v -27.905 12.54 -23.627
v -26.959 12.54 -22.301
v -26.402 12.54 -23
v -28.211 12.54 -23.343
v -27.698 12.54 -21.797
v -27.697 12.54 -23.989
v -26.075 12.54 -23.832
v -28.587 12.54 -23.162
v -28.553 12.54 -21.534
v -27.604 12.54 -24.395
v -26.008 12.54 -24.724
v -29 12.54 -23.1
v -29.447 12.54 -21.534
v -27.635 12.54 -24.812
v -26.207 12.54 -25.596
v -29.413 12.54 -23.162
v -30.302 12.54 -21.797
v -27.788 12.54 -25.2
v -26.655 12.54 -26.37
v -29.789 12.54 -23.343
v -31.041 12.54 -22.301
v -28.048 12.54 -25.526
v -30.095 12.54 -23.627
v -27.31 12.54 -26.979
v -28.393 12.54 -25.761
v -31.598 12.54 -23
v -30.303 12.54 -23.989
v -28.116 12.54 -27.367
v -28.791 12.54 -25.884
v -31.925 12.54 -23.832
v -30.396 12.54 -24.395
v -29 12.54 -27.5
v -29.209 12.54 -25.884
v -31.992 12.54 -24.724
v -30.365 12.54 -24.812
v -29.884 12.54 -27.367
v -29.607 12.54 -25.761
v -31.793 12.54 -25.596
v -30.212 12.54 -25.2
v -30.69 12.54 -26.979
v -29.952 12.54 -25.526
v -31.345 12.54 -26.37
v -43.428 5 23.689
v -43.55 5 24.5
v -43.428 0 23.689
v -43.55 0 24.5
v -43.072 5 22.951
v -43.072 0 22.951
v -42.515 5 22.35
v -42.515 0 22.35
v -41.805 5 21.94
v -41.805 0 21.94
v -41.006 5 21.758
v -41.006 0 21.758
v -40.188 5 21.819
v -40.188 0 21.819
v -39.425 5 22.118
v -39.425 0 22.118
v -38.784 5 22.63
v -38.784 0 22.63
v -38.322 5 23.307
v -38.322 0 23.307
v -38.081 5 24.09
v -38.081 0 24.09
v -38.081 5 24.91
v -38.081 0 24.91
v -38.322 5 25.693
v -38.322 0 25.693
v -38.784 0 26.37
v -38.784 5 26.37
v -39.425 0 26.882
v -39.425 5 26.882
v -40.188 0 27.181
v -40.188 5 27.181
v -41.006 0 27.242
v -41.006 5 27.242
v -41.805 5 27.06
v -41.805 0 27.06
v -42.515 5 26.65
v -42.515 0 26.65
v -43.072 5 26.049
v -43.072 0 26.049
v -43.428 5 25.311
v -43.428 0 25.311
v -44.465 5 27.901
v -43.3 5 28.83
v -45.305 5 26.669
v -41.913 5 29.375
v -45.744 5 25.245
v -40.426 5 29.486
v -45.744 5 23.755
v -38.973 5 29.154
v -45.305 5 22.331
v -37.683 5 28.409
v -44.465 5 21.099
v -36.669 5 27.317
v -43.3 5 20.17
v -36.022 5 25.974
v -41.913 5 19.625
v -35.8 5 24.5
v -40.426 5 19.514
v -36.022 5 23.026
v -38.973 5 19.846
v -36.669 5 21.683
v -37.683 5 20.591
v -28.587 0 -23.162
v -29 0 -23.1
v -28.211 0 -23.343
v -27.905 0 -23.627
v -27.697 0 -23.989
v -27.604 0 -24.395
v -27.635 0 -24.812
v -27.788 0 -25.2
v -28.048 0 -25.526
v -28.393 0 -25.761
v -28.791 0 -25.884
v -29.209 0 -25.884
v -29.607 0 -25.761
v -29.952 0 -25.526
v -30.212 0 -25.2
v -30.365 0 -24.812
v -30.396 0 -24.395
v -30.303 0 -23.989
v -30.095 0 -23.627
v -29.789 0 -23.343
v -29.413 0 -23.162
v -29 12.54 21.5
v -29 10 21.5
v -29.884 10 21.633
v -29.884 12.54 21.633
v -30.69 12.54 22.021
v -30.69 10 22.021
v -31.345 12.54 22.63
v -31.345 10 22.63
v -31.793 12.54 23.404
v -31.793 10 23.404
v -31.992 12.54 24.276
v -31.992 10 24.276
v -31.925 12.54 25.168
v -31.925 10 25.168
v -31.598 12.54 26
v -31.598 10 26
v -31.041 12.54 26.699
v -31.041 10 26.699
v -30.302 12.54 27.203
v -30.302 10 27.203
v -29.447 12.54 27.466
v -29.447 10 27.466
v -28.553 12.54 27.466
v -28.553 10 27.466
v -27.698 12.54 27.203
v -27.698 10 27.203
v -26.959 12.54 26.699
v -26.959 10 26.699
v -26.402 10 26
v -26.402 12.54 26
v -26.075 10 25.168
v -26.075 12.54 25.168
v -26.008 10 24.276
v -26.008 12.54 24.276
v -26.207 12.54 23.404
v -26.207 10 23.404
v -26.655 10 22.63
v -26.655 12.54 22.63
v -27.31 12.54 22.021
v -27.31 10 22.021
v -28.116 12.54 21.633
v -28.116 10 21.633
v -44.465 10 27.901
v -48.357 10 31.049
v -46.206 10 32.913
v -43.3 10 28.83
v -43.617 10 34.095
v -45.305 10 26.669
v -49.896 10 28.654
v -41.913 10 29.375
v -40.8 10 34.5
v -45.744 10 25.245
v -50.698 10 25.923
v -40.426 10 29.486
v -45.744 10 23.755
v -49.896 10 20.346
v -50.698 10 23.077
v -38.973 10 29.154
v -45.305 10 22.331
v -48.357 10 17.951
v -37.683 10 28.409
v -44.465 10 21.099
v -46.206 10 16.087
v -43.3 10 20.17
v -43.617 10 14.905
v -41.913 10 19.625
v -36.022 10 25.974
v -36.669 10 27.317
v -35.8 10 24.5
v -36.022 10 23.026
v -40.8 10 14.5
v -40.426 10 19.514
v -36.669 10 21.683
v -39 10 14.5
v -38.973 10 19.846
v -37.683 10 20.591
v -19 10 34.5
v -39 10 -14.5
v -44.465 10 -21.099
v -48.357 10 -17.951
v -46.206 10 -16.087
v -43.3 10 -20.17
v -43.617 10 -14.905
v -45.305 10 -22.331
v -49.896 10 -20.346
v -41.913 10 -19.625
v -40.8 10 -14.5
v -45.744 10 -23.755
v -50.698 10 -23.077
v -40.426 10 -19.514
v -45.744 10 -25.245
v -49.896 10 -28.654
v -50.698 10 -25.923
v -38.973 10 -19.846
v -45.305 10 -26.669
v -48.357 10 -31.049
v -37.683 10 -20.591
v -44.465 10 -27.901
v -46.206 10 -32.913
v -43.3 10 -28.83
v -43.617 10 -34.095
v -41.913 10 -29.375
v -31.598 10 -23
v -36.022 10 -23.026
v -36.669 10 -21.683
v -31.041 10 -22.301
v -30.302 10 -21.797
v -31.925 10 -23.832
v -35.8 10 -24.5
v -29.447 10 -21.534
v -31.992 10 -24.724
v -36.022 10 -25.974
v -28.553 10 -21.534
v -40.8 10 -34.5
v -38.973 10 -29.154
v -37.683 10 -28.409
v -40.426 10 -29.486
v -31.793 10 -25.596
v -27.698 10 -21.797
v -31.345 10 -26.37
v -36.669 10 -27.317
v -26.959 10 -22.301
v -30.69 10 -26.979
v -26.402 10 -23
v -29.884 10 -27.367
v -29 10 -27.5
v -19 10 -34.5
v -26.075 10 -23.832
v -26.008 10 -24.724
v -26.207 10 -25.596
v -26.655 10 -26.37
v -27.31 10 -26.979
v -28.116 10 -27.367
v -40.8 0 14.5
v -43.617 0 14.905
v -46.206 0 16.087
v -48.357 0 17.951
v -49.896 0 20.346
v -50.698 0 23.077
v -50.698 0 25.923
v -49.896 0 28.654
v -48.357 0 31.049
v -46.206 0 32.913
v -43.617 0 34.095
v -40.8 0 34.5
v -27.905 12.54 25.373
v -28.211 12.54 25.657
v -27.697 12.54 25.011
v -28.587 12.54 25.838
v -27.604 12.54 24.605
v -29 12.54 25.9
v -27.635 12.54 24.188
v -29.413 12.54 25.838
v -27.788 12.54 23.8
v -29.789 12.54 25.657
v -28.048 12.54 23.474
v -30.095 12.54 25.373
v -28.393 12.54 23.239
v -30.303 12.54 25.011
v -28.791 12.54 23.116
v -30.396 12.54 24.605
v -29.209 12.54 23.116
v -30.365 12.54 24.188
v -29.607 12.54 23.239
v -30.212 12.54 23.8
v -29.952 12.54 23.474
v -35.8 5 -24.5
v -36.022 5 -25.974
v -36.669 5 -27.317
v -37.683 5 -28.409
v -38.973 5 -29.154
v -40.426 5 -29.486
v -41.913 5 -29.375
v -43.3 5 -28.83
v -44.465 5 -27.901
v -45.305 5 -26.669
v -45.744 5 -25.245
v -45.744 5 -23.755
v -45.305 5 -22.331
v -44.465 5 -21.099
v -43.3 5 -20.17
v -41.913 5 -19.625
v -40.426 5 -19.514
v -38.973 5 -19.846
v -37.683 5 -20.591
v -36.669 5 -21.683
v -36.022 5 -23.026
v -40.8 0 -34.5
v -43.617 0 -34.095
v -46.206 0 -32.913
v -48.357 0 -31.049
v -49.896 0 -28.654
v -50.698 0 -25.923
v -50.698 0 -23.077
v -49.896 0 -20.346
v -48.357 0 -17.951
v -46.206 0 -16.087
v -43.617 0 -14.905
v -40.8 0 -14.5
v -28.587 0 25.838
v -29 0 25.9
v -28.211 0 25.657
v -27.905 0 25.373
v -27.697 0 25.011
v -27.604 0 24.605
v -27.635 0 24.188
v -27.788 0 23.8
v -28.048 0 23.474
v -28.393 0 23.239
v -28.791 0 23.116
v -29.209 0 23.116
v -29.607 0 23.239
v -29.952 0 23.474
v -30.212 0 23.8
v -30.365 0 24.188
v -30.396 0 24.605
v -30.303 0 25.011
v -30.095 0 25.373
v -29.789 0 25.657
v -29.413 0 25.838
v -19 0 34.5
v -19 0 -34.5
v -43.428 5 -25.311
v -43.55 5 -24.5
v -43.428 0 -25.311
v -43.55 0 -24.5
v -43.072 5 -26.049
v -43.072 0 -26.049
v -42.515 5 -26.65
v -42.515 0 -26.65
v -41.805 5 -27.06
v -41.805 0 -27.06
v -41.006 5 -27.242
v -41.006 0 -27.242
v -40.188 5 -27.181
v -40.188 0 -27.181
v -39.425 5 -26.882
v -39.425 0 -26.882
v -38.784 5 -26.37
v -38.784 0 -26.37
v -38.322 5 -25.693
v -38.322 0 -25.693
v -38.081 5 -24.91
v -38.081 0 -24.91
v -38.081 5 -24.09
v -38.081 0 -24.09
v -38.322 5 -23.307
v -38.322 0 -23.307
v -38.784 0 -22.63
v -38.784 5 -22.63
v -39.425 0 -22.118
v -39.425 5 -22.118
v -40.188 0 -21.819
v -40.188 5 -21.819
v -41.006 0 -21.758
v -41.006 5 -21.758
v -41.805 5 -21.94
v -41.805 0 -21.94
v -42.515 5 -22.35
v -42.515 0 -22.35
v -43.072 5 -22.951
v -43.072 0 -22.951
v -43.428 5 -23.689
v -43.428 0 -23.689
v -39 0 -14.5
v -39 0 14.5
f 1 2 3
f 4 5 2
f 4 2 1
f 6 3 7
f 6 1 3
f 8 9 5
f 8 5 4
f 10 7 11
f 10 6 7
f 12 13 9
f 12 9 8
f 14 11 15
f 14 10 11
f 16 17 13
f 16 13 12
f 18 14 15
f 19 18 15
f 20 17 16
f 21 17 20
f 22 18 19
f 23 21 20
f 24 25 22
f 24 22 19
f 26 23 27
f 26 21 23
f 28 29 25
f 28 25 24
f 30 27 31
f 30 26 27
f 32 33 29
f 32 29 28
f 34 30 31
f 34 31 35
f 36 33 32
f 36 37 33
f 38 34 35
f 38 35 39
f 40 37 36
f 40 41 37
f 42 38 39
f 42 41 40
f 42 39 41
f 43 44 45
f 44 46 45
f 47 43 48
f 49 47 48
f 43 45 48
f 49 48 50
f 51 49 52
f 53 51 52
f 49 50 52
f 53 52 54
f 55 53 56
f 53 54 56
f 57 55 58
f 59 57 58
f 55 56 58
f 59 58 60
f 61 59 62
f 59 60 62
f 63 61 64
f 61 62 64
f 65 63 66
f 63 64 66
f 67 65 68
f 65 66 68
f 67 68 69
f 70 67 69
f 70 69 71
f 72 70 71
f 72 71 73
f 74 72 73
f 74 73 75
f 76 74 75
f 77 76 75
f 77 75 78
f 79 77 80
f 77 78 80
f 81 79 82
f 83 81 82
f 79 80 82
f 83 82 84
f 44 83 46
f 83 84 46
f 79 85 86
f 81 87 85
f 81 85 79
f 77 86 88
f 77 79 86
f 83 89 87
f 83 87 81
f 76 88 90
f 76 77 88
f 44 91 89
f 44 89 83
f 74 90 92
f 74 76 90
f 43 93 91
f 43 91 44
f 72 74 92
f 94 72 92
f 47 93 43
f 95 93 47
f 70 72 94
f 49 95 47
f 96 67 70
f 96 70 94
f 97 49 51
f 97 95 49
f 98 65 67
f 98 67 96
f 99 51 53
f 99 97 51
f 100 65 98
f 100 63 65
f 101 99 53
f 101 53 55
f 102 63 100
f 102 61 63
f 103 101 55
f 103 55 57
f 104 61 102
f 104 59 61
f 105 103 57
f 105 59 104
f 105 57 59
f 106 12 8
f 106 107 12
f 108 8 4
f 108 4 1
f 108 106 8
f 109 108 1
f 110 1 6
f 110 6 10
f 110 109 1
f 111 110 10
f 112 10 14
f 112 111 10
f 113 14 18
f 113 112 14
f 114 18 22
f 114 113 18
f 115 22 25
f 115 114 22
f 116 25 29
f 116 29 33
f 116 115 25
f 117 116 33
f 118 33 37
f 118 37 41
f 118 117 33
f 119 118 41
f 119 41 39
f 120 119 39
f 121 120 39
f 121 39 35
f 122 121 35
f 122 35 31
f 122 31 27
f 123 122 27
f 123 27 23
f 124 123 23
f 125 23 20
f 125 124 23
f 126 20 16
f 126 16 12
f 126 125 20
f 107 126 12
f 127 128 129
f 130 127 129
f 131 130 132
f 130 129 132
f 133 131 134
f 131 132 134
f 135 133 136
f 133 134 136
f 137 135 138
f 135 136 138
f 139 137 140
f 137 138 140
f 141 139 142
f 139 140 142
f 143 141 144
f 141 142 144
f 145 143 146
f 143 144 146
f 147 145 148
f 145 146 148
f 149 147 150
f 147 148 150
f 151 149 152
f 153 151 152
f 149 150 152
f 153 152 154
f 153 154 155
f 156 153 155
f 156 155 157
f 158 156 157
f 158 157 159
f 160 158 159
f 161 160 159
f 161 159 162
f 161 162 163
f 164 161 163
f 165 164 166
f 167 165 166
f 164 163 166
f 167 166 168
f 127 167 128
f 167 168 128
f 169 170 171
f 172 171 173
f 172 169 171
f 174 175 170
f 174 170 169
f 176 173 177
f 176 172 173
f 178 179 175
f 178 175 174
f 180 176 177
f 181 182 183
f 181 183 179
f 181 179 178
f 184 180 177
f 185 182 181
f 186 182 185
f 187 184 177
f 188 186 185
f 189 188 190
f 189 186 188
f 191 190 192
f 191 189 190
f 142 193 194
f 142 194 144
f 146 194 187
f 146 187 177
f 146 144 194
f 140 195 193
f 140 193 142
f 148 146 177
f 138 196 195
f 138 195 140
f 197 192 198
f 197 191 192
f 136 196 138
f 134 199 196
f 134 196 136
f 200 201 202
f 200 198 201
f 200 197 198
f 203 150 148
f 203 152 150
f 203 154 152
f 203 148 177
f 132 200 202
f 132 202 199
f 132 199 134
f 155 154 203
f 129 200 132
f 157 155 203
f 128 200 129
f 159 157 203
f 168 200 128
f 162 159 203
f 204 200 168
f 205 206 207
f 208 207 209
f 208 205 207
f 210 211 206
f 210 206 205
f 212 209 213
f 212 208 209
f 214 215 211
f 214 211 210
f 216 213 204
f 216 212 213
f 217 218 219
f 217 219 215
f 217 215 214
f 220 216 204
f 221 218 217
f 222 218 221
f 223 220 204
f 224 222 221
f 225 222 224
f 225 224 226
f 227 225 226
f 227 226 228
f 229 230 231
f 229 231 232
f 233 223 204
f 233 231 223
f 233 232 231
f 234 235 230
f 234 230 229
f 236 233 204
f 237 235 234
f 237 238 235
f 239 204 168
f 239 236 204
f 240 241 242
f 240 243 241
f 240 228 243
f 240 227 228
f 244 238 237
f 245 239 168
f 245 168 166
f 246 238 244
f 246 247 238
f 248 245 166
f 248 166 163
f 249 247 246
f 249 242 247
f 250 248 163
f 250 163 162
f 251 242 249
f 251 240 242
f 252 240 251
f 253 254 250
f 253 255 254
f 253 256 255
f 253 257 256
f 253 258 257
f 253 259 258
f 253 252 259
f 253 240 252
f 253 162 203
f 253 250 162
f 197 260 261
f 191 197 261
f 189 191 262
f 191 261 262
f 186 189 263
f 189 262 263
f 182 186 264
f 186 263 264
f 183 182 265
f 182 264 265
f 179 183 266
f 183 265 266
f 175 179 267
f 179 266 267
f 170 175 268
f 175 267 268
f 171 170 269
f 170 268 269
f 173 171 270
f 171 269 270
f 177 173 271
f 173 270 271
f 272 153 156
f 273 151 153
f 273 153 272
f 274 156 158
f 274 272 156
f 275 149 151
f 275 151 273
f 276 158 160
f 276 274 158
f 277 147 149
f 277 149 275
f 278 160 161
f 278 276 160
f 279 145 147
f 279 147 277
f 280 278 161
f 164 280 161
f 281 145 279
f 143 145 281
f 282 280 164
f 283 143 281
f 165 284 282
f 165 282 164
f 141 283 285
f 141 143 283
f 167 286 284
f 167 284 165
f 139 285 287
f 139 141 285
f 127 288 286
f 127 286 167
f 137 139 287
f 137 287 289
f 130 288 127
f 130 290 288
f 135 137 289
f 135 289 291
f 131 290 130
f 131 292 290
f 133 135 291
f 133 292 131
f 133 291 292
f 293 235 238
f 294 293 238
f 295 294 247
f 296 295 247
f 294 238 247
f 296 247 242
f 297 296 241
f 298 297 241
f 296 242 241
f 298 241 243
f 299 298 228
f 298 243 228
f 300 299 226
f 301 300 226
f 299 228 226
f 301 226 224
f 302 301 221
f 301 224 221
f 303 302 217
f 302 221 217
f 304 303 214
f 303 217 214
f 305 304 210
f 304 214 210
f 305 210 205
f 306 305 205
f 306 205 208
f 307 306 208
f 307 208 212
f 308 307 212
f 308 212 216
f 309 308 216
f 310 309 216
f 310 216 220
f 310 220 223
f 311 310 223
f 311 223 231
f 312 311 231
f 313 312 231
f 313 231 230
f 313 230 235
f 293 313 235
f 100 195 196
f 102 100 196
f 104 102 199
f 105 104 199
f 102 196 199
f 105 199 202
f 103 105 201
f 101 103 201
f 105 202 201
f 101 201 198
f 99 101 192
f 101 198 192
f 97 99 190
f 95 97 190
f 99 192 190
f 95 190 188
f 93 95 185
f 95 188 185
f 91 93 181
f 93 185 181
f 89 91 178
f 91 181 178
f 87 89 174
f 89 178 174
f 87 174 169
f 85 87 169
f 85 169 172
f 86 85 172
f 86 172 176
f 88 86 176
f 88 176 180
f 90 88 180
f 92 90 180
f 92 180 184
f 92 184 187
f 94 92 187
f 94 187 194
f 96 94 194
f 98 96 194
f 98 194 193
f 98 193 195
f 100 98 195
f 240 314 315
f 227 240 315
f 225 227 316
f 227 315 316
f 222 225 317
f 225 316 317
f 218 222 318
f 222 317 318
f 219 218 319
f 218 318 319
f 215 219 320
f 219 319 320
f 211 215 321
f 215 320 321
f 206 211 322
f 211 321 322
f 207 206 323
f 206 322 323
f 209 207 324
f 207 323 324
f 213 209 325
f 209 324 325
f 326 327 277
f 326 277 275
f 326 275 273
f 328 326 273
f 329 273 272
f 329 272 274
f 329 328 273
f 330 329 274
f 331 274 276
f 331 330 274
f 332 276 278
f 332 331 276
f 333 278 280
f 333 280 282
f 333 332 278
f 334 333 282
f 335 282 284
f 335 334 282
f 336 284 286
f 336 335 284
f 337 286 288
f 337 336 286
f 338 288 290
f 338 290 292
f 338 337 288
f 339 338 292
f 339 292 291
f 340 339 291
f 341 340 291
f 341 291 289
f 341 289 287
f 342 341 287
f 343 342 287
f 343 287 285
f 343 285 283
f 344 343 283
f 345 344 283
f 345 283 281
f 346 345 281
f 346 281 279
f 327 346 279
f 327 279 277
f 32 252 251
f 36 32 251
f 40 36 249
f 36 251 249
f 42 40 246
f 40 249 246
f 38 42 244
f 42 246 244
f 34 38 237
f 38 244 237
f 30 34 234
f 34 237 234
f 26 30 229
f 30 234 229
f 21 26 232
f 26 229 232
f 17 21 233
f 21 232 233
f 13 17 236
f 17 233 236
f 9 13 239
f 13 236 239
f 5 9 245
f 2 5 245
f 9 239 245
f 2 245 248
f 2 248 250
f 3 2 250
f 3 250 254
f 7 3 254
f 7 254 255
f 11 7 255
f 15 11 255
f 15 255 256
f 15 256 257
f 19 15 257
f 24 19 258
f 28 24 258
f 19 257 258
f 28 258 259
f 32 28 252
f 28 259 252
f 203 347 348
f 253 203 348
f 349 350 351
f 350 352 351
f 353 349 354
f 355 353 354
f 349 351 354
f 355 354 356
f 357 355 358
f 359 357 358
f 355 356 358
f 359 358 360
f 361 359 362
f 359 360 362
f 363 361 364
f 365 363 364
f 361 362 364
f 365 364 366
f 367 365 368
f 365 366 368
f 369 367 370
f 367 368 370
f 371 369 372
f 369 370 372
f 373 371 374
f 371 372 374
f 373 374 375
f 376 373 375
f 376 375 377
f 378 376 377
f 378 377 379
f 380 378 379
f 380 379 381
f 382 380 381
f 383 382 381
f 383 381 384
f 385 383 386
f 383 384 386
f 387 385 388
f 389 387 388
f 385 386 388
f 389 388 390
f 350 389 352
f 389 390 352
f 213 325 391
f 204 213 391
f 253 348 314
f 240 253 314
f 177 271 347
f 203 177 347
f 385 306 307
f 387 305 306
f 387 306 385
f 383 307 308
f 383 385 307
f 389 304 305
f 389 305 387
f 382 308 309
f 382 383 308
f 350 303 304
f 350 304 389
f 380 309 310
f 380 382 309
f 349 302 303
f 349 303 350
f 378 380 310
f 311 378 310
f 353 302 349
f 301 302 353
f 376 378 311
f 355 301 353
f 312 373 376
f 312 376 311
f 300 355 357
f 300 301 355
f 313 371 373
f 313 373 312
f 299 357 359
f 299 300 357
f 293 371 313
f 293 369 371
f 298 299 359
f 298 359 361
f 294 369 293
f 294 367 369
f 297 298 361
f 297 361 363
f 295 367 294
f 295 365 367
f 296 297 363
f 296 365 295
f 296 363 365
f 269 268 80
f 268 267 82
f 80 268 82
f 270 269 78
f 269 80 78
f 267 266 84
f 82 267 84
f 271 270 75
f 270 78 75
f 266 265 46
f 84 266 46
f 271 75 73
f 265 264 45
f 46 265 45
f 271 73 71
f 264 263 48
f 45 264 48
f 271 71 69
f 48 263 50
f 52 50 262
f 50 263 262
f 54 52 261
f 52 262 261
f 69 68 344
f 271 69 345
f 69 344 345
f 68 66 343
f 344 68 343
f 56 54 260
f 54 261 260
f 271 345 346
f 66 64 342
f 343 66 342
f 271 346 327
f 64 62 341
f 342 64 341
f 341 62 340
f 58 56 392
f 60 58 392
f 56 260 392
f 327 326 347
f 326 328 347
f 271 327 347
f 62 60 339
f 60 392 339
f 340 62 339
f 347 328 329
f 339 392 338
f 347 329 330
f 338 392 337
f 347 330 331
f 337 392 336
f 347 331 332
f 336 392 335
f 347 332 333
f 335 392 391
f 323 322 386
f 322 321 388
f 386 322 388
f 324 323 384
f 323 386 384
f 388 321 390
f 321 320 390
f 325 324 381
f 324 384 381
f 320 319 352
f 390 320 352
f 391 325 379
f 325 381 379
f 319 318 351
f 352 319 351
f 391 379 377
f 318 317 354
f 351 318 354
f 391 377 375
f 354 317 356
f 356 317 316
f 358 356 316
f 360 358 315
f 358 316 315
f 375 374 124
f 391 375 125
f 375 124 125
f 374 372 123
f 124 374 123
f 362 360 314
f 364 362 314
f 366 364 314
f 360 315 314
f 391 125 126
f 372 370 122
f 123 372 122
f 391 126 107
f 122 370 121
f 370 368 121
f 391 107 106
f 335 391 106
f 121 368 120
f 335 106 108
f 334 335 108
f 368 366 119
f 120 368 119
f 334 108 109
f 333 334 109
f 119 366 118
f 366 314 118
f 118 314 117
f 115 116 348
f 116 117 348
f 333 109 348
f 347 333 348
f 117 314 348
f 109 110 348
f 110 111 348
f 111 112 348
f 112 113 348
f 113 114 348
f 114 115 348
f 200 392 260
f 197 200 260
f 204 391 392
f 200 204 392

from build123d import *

# Parameters (mm, degrees)
SKETCH2_R                      = 1.4
BOSS_EXTRUDE1_DEPTH            = 10
SKETCH3_R                      = 3
SKETCH3_R_2                    = 1.4
BOSS_EXTRUDE2_DEPTH            = 2.54
CBORE_FOR_M5_SHCS1_D           = 5.5
CBORE_FOR_M5_SHCS1_DEPTH       = 12
CBORE_FOR_M5_SHCS1_CBORE_D     = 10
CBORE_FOR_M5_SHCS1_CBORE_DEPTH = 5
CBORE_FOR_M5_SHCS1_TIP         = 1.652366702


with BuildPart() as part:
    # Sketch2 → Boss-Extrude1 (new body)
    with BuildSketch(Plane(origin=(0, 0, 0), x_dir=(1, 0, 0), z_dir=(0, 1, 0))):
        with BuildLine():
            Line((-40.8, 14.5), (-39, 14.5))
            Line((-39, 14.5), (-39, -14.5))
            Line((-39, -14.5), (-40.8, -14.5))
            ThreePointArc((-40.8, -14.5), (-50.8, -24.5), (-40.8, -34.5))
            Line((-40.8, -34.5), (-19, -34.5))
            Line((-19, -34.5), (-19, 34.5))
            Line((-19, 34.5), (-40.8, 34.5))
            ThreePointArc((-40.8, 34.5), (-50.8, 24.5), (-40.8, 14.5))
        make_face()
        with Locations(Location((-29, -24.5, 0), (0, 0, 270))):
            Circle(SKETCH2_R, mode=Mode.SUBTRACT)
        with Locations(Location((-29, 24.5, 0), (0, 0, 270))):
            Circle(SKETCH2_R, mode=Mode.SUBTRACT)
    extrude(amount=BOSS_EXTRUDE1_DEPTH)

    # Sketch3 → Boss-Extrude2 (add)
    # profile 1 of 2: a face of its own
    with BuildSketch(Plane(origin=(0, 10, 0), x_dir=(1, 0, 0), z_dir=(0, 1, 0))):
        with Locations(Location((-29, 24.5, 0), (0, 0, 90))):
            Circle(SKETCH3_R)
        with Locations(Location((-29, 24.5, 0), (0, 0, 270))):
            Circle(SKETCH3_R_2, mode=Mode.SUBTRACT)
    # profile 2 of 2: a face of its own
    with BuildSketch(Plane(origin=(0, 10, 0), x_dir=(1, 0, 0), z_dir=(0, 1, 0))):
        with Locations(Location((-29, -24.5, 0), (0, 0, 90))):
            Circle(SKETCH3_R)
        with Locations(Location((-29, -24.5, 0), (0, 0, 270))):
            Circle(SKETCH3_R_2, mode=Mode.SUBTRACT)
    extrude(amount=BOSS_EXTRUDE2_DEPTH)

    # CBORE for M5 SHCS1
    with Locations(Plane(origin=(0, 10, 0), x_dir=(1, 0, 0), z_dir=(0, 1, 0))):
        with Locations((-40.8, -24.5), (-40.8, 24.5)):
            CounterBoreHole(CBORE_FOR_M5_SHCS1_D / 2, CBORE_FOR_M5_SHCS1_CBORE_D / 2, CBORE_FOR_M5_SHCS1_CBORE_DEPTH, depth=CBORE_FOR_M5_SHCS1_DEPTH)
            with Locations((0, 0, -(CBORE_FOR_M5_SHCS1_DEPTH + CBORE_FOR_M5_SHCS1_TIP / 2))):  # 118° drill point
                Cone(0, CBORE_FOR_M5_SHCS1_D / 2, CBORE_FOR_M5_SHCS1_TIP, mode=Mode.SUBTRACT)


solid = part.part
